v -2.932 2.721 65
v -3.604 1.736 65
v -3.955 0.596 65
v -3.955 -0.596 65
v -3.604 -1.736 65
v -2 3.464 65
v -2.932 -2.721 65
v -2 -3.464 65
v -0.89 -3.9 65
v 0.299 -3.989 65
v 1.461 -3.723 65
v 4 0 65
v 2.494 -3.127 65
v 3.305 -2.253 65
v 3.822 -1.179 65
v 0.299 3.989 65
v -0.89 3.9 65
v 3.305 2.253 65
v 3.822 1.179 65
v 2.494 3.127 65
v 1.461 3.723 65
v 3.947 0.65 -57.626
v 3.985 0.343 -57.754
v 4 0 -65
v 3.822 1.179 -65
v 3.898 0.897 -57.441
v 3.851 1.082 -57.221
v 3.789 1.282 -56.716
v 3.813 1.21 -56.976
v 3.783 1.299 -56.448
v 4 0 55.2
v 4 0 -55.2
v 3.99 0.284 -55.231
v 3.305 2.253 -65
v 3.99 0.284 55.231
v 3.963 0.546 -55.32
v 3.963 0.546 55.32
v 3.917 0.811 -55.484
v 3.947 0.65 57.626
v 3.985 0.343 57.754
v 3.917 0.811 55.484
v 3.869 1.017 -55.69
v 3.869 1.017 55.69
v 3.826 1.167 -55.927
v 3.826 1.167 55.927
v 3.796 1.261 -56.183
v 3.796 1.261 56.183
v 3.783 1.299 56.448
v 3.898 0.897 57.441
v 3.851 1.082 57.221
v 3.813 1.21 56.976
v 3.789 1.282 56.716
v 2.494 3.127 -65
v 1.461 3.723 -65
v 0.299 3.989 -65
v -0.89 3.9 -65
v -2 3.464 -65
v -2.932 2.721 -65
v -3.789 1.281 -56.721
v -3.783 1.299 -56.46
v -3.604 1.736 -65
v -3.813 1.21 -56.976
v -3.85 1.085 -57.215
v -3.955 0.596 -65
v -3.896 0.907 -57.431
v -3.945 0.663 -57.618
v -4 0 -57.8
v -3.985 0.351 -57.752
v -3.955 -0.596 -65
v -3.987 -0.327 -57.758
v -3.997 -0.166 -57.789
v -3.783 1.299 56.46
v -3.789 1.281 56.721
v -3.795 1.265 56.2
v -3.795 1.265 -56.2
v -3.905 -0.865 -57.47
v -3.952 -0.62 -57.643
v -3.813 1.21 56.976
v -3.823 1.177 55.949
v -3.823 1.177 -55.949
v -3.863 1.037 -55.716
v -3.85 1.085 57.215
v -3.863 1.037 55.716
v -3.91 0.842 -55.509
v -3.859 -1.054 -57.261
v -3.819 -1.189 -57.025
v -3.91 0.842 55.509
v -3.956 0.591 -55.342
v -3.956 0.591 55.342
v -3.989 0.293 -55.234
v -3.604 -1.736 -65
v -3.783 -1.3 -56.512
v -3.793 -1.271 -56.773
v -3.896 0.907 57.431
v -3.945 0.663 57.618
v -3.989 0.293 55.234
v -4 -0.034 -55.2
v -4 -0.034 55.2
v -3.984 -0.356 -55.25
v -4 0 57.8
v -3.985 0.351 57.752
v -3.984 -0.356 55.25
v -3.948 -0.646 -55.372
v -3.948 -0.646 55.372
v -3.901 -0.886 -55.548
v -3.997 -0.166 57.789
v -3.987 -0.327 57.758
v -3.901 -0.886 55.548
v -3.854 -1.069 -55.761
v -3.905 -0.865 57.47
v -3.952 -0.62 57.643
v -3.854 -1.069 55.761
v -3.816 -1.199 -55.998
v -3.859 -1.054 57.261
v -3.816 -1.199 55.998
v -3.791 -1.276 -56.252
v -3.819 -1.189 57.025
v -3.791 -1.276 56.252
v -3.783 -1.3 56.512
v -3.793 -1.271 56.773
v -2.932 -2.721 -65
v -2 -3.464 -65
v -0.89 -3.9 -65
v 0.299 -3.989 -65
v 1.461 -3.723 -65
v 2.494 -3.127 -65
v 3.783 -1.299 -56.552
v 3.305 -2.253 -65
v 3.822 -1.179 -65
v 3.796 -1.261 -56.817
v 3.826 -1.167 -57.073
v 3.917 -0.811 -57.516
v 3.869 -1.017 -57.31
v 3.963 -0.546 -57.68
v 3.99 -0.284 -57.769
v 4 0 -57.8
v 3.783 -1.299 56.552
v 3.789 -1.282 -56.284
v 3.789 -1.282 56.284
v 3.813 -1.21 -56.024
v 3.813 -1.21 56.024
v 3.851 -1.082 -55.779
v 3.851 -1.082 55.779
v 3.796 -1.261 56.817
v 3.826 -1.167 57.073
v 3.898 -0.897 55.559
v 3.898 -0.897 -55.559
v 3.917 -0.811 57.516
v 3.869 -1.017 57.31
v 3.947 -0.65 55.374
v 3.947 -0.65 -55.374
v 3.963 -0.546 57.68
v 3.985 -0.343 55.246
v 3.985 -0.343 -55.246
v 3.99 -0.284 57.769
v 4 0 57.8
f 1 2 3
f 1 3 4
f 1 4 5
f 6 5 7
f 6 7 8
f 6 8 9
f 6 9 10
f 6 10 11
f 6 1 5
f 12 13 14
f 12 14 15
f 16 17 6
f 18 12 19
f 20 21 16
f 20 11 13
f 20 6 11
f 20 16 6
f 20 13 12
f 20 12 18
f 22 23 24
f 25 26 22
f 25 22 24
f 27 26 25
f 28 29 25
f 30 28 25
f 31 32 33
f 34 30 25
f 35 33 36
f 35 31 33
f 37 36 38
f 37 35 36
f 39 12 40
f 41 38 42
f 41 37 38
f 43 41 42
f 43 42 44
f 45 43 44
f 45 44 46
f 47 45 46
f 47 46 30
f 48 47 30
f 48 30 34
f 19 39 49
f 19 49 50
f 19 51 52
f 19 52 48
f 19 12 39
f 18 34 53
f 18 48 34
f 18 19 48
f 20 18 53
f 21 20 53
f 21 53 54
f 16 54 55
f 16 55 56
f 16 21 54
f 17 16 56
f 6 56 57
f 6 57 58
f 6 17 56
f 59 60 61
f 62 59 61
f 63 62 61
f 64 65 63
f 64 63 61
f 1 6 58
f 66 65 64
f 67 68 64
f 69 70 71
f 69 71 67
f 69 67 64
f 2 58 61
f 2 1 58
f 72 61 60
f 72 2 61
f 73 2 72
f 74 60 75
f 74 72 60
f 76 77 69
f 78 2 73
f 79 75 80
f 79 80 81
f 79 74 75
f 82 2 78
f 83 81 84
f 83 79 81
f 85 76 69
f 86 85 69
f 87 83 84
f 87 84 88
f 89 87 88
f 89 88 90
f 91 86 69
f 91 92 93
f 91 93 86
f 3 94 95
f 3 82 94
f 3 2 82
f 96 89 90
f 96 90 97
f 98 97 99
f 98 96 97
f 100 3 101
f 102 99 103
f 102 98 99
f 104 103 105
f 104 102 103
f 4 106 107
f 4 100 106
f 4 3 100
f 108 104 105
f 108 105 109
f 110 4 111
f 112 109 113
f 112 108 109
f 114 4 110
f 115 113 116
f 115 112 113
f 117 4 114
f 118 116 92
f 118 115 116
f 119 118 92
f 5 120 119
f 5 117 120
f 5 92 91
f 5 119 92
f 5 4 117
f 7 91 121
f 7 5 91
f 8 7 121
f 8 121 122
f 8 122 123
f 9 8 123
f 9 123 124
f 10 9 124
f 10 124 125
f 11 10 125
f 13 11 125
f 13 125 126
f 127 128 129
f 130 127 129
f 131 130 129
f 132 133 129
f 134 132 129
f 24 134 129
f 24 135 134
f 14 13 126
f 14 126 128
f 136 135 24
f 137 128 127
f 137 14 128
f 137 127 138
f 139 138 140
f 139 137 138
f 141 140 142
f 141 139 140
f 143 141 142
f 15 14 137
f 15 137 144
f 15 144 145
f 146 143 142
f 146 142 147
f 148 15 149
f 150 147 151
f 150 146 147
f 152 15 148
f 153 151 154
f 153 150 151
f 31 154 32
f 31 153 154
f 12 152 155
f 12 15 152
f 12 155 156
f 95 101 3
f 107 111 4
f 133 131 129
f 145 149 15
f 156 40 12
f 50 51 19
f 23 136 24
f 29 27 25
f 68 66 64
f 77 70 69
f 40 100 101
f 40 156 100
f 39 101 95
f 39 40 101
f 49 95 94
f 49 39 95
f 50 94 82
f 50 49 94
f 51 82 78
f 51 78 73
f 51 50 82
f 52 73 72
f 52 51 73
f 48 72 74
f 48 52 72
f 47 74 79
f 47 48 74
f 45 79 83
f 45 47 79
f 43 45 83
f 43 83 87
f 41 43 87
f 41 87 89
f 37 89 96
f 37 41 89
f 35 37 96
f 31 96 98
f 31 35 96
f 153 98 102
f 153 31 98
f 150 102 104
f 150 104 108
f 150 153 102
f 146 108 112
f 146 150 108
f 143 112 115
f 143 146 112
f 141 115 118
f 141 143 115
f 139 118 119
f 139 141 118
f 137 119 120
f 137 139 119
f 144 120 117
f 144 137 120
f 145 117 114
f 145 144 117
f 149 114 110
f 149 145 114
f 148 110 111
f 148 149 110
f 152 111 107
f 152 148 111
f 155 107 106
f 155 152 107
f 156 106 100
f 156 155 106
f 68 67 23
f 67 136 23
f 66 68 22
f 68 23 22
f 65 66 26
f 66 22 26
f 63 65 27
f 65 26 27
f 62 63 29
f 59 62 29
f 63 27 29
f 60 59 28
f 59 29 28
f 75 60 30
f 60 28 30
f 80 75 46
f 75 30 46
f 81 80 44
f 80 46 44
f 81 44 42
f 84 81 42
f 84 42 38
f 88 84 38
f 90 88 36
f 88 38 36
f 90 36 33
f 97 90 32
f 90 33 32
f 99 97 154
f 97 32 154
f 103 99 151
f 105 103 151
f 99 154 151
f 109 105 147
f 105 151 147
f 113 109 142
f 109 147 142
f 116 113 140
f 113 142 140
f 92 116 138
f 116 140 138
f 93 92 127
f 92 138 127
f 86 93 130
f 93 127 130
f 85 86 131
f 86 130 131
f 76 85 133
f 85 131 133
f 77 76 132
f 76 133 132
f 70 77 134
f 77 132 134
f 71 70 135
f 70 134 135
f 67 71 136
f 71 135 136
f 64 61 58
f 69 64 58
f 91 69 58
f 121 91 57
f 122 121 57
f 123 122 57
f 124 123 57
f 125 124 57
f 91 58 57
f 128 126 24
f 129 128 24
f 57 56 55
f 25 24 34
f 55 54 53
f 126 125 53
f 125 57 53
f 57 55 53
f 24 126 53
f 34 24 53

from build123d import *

# Parameters (mm, degrees)
SKETCH1_R           = 4
BOSS_EXTRUDE1_DEPTH = 65
SKETCH2_R           = 1.3
CUT_EXTRUDE1_DEPTH  = 66.245689513


with BuildPart() as part:
    # Sketch1 → Boss-Extrude1 (new, symmetric)
    with BuildSketch(Plane.XY):
        Circle(SKETCH1_R)
    extrude(amount=BOSS_EXTRUDE1_DEPTH, both=True)

    # Sketch2 → Cut-Extrude1 (cut, symmetric)
    with BuildSketch(Plane(origin=(0, 0, 0), x_dir=(0, 0, -1), z_dir=(1, 0, 0))):
        with Locations((56.5, 0)):
            Circle(SKETCH2_R)
    cut_extrude1 = extrude(amount=CUT_EXTRUDE1_DEPTH, both=True, mode=Mode.SUBTRACT)

    # Mirror1: Cut-Extrude1 across plane
    add(cut_extrude1.mirror(Plane.XY), mode=Mode.SUBTRACT)


solid = part.part
